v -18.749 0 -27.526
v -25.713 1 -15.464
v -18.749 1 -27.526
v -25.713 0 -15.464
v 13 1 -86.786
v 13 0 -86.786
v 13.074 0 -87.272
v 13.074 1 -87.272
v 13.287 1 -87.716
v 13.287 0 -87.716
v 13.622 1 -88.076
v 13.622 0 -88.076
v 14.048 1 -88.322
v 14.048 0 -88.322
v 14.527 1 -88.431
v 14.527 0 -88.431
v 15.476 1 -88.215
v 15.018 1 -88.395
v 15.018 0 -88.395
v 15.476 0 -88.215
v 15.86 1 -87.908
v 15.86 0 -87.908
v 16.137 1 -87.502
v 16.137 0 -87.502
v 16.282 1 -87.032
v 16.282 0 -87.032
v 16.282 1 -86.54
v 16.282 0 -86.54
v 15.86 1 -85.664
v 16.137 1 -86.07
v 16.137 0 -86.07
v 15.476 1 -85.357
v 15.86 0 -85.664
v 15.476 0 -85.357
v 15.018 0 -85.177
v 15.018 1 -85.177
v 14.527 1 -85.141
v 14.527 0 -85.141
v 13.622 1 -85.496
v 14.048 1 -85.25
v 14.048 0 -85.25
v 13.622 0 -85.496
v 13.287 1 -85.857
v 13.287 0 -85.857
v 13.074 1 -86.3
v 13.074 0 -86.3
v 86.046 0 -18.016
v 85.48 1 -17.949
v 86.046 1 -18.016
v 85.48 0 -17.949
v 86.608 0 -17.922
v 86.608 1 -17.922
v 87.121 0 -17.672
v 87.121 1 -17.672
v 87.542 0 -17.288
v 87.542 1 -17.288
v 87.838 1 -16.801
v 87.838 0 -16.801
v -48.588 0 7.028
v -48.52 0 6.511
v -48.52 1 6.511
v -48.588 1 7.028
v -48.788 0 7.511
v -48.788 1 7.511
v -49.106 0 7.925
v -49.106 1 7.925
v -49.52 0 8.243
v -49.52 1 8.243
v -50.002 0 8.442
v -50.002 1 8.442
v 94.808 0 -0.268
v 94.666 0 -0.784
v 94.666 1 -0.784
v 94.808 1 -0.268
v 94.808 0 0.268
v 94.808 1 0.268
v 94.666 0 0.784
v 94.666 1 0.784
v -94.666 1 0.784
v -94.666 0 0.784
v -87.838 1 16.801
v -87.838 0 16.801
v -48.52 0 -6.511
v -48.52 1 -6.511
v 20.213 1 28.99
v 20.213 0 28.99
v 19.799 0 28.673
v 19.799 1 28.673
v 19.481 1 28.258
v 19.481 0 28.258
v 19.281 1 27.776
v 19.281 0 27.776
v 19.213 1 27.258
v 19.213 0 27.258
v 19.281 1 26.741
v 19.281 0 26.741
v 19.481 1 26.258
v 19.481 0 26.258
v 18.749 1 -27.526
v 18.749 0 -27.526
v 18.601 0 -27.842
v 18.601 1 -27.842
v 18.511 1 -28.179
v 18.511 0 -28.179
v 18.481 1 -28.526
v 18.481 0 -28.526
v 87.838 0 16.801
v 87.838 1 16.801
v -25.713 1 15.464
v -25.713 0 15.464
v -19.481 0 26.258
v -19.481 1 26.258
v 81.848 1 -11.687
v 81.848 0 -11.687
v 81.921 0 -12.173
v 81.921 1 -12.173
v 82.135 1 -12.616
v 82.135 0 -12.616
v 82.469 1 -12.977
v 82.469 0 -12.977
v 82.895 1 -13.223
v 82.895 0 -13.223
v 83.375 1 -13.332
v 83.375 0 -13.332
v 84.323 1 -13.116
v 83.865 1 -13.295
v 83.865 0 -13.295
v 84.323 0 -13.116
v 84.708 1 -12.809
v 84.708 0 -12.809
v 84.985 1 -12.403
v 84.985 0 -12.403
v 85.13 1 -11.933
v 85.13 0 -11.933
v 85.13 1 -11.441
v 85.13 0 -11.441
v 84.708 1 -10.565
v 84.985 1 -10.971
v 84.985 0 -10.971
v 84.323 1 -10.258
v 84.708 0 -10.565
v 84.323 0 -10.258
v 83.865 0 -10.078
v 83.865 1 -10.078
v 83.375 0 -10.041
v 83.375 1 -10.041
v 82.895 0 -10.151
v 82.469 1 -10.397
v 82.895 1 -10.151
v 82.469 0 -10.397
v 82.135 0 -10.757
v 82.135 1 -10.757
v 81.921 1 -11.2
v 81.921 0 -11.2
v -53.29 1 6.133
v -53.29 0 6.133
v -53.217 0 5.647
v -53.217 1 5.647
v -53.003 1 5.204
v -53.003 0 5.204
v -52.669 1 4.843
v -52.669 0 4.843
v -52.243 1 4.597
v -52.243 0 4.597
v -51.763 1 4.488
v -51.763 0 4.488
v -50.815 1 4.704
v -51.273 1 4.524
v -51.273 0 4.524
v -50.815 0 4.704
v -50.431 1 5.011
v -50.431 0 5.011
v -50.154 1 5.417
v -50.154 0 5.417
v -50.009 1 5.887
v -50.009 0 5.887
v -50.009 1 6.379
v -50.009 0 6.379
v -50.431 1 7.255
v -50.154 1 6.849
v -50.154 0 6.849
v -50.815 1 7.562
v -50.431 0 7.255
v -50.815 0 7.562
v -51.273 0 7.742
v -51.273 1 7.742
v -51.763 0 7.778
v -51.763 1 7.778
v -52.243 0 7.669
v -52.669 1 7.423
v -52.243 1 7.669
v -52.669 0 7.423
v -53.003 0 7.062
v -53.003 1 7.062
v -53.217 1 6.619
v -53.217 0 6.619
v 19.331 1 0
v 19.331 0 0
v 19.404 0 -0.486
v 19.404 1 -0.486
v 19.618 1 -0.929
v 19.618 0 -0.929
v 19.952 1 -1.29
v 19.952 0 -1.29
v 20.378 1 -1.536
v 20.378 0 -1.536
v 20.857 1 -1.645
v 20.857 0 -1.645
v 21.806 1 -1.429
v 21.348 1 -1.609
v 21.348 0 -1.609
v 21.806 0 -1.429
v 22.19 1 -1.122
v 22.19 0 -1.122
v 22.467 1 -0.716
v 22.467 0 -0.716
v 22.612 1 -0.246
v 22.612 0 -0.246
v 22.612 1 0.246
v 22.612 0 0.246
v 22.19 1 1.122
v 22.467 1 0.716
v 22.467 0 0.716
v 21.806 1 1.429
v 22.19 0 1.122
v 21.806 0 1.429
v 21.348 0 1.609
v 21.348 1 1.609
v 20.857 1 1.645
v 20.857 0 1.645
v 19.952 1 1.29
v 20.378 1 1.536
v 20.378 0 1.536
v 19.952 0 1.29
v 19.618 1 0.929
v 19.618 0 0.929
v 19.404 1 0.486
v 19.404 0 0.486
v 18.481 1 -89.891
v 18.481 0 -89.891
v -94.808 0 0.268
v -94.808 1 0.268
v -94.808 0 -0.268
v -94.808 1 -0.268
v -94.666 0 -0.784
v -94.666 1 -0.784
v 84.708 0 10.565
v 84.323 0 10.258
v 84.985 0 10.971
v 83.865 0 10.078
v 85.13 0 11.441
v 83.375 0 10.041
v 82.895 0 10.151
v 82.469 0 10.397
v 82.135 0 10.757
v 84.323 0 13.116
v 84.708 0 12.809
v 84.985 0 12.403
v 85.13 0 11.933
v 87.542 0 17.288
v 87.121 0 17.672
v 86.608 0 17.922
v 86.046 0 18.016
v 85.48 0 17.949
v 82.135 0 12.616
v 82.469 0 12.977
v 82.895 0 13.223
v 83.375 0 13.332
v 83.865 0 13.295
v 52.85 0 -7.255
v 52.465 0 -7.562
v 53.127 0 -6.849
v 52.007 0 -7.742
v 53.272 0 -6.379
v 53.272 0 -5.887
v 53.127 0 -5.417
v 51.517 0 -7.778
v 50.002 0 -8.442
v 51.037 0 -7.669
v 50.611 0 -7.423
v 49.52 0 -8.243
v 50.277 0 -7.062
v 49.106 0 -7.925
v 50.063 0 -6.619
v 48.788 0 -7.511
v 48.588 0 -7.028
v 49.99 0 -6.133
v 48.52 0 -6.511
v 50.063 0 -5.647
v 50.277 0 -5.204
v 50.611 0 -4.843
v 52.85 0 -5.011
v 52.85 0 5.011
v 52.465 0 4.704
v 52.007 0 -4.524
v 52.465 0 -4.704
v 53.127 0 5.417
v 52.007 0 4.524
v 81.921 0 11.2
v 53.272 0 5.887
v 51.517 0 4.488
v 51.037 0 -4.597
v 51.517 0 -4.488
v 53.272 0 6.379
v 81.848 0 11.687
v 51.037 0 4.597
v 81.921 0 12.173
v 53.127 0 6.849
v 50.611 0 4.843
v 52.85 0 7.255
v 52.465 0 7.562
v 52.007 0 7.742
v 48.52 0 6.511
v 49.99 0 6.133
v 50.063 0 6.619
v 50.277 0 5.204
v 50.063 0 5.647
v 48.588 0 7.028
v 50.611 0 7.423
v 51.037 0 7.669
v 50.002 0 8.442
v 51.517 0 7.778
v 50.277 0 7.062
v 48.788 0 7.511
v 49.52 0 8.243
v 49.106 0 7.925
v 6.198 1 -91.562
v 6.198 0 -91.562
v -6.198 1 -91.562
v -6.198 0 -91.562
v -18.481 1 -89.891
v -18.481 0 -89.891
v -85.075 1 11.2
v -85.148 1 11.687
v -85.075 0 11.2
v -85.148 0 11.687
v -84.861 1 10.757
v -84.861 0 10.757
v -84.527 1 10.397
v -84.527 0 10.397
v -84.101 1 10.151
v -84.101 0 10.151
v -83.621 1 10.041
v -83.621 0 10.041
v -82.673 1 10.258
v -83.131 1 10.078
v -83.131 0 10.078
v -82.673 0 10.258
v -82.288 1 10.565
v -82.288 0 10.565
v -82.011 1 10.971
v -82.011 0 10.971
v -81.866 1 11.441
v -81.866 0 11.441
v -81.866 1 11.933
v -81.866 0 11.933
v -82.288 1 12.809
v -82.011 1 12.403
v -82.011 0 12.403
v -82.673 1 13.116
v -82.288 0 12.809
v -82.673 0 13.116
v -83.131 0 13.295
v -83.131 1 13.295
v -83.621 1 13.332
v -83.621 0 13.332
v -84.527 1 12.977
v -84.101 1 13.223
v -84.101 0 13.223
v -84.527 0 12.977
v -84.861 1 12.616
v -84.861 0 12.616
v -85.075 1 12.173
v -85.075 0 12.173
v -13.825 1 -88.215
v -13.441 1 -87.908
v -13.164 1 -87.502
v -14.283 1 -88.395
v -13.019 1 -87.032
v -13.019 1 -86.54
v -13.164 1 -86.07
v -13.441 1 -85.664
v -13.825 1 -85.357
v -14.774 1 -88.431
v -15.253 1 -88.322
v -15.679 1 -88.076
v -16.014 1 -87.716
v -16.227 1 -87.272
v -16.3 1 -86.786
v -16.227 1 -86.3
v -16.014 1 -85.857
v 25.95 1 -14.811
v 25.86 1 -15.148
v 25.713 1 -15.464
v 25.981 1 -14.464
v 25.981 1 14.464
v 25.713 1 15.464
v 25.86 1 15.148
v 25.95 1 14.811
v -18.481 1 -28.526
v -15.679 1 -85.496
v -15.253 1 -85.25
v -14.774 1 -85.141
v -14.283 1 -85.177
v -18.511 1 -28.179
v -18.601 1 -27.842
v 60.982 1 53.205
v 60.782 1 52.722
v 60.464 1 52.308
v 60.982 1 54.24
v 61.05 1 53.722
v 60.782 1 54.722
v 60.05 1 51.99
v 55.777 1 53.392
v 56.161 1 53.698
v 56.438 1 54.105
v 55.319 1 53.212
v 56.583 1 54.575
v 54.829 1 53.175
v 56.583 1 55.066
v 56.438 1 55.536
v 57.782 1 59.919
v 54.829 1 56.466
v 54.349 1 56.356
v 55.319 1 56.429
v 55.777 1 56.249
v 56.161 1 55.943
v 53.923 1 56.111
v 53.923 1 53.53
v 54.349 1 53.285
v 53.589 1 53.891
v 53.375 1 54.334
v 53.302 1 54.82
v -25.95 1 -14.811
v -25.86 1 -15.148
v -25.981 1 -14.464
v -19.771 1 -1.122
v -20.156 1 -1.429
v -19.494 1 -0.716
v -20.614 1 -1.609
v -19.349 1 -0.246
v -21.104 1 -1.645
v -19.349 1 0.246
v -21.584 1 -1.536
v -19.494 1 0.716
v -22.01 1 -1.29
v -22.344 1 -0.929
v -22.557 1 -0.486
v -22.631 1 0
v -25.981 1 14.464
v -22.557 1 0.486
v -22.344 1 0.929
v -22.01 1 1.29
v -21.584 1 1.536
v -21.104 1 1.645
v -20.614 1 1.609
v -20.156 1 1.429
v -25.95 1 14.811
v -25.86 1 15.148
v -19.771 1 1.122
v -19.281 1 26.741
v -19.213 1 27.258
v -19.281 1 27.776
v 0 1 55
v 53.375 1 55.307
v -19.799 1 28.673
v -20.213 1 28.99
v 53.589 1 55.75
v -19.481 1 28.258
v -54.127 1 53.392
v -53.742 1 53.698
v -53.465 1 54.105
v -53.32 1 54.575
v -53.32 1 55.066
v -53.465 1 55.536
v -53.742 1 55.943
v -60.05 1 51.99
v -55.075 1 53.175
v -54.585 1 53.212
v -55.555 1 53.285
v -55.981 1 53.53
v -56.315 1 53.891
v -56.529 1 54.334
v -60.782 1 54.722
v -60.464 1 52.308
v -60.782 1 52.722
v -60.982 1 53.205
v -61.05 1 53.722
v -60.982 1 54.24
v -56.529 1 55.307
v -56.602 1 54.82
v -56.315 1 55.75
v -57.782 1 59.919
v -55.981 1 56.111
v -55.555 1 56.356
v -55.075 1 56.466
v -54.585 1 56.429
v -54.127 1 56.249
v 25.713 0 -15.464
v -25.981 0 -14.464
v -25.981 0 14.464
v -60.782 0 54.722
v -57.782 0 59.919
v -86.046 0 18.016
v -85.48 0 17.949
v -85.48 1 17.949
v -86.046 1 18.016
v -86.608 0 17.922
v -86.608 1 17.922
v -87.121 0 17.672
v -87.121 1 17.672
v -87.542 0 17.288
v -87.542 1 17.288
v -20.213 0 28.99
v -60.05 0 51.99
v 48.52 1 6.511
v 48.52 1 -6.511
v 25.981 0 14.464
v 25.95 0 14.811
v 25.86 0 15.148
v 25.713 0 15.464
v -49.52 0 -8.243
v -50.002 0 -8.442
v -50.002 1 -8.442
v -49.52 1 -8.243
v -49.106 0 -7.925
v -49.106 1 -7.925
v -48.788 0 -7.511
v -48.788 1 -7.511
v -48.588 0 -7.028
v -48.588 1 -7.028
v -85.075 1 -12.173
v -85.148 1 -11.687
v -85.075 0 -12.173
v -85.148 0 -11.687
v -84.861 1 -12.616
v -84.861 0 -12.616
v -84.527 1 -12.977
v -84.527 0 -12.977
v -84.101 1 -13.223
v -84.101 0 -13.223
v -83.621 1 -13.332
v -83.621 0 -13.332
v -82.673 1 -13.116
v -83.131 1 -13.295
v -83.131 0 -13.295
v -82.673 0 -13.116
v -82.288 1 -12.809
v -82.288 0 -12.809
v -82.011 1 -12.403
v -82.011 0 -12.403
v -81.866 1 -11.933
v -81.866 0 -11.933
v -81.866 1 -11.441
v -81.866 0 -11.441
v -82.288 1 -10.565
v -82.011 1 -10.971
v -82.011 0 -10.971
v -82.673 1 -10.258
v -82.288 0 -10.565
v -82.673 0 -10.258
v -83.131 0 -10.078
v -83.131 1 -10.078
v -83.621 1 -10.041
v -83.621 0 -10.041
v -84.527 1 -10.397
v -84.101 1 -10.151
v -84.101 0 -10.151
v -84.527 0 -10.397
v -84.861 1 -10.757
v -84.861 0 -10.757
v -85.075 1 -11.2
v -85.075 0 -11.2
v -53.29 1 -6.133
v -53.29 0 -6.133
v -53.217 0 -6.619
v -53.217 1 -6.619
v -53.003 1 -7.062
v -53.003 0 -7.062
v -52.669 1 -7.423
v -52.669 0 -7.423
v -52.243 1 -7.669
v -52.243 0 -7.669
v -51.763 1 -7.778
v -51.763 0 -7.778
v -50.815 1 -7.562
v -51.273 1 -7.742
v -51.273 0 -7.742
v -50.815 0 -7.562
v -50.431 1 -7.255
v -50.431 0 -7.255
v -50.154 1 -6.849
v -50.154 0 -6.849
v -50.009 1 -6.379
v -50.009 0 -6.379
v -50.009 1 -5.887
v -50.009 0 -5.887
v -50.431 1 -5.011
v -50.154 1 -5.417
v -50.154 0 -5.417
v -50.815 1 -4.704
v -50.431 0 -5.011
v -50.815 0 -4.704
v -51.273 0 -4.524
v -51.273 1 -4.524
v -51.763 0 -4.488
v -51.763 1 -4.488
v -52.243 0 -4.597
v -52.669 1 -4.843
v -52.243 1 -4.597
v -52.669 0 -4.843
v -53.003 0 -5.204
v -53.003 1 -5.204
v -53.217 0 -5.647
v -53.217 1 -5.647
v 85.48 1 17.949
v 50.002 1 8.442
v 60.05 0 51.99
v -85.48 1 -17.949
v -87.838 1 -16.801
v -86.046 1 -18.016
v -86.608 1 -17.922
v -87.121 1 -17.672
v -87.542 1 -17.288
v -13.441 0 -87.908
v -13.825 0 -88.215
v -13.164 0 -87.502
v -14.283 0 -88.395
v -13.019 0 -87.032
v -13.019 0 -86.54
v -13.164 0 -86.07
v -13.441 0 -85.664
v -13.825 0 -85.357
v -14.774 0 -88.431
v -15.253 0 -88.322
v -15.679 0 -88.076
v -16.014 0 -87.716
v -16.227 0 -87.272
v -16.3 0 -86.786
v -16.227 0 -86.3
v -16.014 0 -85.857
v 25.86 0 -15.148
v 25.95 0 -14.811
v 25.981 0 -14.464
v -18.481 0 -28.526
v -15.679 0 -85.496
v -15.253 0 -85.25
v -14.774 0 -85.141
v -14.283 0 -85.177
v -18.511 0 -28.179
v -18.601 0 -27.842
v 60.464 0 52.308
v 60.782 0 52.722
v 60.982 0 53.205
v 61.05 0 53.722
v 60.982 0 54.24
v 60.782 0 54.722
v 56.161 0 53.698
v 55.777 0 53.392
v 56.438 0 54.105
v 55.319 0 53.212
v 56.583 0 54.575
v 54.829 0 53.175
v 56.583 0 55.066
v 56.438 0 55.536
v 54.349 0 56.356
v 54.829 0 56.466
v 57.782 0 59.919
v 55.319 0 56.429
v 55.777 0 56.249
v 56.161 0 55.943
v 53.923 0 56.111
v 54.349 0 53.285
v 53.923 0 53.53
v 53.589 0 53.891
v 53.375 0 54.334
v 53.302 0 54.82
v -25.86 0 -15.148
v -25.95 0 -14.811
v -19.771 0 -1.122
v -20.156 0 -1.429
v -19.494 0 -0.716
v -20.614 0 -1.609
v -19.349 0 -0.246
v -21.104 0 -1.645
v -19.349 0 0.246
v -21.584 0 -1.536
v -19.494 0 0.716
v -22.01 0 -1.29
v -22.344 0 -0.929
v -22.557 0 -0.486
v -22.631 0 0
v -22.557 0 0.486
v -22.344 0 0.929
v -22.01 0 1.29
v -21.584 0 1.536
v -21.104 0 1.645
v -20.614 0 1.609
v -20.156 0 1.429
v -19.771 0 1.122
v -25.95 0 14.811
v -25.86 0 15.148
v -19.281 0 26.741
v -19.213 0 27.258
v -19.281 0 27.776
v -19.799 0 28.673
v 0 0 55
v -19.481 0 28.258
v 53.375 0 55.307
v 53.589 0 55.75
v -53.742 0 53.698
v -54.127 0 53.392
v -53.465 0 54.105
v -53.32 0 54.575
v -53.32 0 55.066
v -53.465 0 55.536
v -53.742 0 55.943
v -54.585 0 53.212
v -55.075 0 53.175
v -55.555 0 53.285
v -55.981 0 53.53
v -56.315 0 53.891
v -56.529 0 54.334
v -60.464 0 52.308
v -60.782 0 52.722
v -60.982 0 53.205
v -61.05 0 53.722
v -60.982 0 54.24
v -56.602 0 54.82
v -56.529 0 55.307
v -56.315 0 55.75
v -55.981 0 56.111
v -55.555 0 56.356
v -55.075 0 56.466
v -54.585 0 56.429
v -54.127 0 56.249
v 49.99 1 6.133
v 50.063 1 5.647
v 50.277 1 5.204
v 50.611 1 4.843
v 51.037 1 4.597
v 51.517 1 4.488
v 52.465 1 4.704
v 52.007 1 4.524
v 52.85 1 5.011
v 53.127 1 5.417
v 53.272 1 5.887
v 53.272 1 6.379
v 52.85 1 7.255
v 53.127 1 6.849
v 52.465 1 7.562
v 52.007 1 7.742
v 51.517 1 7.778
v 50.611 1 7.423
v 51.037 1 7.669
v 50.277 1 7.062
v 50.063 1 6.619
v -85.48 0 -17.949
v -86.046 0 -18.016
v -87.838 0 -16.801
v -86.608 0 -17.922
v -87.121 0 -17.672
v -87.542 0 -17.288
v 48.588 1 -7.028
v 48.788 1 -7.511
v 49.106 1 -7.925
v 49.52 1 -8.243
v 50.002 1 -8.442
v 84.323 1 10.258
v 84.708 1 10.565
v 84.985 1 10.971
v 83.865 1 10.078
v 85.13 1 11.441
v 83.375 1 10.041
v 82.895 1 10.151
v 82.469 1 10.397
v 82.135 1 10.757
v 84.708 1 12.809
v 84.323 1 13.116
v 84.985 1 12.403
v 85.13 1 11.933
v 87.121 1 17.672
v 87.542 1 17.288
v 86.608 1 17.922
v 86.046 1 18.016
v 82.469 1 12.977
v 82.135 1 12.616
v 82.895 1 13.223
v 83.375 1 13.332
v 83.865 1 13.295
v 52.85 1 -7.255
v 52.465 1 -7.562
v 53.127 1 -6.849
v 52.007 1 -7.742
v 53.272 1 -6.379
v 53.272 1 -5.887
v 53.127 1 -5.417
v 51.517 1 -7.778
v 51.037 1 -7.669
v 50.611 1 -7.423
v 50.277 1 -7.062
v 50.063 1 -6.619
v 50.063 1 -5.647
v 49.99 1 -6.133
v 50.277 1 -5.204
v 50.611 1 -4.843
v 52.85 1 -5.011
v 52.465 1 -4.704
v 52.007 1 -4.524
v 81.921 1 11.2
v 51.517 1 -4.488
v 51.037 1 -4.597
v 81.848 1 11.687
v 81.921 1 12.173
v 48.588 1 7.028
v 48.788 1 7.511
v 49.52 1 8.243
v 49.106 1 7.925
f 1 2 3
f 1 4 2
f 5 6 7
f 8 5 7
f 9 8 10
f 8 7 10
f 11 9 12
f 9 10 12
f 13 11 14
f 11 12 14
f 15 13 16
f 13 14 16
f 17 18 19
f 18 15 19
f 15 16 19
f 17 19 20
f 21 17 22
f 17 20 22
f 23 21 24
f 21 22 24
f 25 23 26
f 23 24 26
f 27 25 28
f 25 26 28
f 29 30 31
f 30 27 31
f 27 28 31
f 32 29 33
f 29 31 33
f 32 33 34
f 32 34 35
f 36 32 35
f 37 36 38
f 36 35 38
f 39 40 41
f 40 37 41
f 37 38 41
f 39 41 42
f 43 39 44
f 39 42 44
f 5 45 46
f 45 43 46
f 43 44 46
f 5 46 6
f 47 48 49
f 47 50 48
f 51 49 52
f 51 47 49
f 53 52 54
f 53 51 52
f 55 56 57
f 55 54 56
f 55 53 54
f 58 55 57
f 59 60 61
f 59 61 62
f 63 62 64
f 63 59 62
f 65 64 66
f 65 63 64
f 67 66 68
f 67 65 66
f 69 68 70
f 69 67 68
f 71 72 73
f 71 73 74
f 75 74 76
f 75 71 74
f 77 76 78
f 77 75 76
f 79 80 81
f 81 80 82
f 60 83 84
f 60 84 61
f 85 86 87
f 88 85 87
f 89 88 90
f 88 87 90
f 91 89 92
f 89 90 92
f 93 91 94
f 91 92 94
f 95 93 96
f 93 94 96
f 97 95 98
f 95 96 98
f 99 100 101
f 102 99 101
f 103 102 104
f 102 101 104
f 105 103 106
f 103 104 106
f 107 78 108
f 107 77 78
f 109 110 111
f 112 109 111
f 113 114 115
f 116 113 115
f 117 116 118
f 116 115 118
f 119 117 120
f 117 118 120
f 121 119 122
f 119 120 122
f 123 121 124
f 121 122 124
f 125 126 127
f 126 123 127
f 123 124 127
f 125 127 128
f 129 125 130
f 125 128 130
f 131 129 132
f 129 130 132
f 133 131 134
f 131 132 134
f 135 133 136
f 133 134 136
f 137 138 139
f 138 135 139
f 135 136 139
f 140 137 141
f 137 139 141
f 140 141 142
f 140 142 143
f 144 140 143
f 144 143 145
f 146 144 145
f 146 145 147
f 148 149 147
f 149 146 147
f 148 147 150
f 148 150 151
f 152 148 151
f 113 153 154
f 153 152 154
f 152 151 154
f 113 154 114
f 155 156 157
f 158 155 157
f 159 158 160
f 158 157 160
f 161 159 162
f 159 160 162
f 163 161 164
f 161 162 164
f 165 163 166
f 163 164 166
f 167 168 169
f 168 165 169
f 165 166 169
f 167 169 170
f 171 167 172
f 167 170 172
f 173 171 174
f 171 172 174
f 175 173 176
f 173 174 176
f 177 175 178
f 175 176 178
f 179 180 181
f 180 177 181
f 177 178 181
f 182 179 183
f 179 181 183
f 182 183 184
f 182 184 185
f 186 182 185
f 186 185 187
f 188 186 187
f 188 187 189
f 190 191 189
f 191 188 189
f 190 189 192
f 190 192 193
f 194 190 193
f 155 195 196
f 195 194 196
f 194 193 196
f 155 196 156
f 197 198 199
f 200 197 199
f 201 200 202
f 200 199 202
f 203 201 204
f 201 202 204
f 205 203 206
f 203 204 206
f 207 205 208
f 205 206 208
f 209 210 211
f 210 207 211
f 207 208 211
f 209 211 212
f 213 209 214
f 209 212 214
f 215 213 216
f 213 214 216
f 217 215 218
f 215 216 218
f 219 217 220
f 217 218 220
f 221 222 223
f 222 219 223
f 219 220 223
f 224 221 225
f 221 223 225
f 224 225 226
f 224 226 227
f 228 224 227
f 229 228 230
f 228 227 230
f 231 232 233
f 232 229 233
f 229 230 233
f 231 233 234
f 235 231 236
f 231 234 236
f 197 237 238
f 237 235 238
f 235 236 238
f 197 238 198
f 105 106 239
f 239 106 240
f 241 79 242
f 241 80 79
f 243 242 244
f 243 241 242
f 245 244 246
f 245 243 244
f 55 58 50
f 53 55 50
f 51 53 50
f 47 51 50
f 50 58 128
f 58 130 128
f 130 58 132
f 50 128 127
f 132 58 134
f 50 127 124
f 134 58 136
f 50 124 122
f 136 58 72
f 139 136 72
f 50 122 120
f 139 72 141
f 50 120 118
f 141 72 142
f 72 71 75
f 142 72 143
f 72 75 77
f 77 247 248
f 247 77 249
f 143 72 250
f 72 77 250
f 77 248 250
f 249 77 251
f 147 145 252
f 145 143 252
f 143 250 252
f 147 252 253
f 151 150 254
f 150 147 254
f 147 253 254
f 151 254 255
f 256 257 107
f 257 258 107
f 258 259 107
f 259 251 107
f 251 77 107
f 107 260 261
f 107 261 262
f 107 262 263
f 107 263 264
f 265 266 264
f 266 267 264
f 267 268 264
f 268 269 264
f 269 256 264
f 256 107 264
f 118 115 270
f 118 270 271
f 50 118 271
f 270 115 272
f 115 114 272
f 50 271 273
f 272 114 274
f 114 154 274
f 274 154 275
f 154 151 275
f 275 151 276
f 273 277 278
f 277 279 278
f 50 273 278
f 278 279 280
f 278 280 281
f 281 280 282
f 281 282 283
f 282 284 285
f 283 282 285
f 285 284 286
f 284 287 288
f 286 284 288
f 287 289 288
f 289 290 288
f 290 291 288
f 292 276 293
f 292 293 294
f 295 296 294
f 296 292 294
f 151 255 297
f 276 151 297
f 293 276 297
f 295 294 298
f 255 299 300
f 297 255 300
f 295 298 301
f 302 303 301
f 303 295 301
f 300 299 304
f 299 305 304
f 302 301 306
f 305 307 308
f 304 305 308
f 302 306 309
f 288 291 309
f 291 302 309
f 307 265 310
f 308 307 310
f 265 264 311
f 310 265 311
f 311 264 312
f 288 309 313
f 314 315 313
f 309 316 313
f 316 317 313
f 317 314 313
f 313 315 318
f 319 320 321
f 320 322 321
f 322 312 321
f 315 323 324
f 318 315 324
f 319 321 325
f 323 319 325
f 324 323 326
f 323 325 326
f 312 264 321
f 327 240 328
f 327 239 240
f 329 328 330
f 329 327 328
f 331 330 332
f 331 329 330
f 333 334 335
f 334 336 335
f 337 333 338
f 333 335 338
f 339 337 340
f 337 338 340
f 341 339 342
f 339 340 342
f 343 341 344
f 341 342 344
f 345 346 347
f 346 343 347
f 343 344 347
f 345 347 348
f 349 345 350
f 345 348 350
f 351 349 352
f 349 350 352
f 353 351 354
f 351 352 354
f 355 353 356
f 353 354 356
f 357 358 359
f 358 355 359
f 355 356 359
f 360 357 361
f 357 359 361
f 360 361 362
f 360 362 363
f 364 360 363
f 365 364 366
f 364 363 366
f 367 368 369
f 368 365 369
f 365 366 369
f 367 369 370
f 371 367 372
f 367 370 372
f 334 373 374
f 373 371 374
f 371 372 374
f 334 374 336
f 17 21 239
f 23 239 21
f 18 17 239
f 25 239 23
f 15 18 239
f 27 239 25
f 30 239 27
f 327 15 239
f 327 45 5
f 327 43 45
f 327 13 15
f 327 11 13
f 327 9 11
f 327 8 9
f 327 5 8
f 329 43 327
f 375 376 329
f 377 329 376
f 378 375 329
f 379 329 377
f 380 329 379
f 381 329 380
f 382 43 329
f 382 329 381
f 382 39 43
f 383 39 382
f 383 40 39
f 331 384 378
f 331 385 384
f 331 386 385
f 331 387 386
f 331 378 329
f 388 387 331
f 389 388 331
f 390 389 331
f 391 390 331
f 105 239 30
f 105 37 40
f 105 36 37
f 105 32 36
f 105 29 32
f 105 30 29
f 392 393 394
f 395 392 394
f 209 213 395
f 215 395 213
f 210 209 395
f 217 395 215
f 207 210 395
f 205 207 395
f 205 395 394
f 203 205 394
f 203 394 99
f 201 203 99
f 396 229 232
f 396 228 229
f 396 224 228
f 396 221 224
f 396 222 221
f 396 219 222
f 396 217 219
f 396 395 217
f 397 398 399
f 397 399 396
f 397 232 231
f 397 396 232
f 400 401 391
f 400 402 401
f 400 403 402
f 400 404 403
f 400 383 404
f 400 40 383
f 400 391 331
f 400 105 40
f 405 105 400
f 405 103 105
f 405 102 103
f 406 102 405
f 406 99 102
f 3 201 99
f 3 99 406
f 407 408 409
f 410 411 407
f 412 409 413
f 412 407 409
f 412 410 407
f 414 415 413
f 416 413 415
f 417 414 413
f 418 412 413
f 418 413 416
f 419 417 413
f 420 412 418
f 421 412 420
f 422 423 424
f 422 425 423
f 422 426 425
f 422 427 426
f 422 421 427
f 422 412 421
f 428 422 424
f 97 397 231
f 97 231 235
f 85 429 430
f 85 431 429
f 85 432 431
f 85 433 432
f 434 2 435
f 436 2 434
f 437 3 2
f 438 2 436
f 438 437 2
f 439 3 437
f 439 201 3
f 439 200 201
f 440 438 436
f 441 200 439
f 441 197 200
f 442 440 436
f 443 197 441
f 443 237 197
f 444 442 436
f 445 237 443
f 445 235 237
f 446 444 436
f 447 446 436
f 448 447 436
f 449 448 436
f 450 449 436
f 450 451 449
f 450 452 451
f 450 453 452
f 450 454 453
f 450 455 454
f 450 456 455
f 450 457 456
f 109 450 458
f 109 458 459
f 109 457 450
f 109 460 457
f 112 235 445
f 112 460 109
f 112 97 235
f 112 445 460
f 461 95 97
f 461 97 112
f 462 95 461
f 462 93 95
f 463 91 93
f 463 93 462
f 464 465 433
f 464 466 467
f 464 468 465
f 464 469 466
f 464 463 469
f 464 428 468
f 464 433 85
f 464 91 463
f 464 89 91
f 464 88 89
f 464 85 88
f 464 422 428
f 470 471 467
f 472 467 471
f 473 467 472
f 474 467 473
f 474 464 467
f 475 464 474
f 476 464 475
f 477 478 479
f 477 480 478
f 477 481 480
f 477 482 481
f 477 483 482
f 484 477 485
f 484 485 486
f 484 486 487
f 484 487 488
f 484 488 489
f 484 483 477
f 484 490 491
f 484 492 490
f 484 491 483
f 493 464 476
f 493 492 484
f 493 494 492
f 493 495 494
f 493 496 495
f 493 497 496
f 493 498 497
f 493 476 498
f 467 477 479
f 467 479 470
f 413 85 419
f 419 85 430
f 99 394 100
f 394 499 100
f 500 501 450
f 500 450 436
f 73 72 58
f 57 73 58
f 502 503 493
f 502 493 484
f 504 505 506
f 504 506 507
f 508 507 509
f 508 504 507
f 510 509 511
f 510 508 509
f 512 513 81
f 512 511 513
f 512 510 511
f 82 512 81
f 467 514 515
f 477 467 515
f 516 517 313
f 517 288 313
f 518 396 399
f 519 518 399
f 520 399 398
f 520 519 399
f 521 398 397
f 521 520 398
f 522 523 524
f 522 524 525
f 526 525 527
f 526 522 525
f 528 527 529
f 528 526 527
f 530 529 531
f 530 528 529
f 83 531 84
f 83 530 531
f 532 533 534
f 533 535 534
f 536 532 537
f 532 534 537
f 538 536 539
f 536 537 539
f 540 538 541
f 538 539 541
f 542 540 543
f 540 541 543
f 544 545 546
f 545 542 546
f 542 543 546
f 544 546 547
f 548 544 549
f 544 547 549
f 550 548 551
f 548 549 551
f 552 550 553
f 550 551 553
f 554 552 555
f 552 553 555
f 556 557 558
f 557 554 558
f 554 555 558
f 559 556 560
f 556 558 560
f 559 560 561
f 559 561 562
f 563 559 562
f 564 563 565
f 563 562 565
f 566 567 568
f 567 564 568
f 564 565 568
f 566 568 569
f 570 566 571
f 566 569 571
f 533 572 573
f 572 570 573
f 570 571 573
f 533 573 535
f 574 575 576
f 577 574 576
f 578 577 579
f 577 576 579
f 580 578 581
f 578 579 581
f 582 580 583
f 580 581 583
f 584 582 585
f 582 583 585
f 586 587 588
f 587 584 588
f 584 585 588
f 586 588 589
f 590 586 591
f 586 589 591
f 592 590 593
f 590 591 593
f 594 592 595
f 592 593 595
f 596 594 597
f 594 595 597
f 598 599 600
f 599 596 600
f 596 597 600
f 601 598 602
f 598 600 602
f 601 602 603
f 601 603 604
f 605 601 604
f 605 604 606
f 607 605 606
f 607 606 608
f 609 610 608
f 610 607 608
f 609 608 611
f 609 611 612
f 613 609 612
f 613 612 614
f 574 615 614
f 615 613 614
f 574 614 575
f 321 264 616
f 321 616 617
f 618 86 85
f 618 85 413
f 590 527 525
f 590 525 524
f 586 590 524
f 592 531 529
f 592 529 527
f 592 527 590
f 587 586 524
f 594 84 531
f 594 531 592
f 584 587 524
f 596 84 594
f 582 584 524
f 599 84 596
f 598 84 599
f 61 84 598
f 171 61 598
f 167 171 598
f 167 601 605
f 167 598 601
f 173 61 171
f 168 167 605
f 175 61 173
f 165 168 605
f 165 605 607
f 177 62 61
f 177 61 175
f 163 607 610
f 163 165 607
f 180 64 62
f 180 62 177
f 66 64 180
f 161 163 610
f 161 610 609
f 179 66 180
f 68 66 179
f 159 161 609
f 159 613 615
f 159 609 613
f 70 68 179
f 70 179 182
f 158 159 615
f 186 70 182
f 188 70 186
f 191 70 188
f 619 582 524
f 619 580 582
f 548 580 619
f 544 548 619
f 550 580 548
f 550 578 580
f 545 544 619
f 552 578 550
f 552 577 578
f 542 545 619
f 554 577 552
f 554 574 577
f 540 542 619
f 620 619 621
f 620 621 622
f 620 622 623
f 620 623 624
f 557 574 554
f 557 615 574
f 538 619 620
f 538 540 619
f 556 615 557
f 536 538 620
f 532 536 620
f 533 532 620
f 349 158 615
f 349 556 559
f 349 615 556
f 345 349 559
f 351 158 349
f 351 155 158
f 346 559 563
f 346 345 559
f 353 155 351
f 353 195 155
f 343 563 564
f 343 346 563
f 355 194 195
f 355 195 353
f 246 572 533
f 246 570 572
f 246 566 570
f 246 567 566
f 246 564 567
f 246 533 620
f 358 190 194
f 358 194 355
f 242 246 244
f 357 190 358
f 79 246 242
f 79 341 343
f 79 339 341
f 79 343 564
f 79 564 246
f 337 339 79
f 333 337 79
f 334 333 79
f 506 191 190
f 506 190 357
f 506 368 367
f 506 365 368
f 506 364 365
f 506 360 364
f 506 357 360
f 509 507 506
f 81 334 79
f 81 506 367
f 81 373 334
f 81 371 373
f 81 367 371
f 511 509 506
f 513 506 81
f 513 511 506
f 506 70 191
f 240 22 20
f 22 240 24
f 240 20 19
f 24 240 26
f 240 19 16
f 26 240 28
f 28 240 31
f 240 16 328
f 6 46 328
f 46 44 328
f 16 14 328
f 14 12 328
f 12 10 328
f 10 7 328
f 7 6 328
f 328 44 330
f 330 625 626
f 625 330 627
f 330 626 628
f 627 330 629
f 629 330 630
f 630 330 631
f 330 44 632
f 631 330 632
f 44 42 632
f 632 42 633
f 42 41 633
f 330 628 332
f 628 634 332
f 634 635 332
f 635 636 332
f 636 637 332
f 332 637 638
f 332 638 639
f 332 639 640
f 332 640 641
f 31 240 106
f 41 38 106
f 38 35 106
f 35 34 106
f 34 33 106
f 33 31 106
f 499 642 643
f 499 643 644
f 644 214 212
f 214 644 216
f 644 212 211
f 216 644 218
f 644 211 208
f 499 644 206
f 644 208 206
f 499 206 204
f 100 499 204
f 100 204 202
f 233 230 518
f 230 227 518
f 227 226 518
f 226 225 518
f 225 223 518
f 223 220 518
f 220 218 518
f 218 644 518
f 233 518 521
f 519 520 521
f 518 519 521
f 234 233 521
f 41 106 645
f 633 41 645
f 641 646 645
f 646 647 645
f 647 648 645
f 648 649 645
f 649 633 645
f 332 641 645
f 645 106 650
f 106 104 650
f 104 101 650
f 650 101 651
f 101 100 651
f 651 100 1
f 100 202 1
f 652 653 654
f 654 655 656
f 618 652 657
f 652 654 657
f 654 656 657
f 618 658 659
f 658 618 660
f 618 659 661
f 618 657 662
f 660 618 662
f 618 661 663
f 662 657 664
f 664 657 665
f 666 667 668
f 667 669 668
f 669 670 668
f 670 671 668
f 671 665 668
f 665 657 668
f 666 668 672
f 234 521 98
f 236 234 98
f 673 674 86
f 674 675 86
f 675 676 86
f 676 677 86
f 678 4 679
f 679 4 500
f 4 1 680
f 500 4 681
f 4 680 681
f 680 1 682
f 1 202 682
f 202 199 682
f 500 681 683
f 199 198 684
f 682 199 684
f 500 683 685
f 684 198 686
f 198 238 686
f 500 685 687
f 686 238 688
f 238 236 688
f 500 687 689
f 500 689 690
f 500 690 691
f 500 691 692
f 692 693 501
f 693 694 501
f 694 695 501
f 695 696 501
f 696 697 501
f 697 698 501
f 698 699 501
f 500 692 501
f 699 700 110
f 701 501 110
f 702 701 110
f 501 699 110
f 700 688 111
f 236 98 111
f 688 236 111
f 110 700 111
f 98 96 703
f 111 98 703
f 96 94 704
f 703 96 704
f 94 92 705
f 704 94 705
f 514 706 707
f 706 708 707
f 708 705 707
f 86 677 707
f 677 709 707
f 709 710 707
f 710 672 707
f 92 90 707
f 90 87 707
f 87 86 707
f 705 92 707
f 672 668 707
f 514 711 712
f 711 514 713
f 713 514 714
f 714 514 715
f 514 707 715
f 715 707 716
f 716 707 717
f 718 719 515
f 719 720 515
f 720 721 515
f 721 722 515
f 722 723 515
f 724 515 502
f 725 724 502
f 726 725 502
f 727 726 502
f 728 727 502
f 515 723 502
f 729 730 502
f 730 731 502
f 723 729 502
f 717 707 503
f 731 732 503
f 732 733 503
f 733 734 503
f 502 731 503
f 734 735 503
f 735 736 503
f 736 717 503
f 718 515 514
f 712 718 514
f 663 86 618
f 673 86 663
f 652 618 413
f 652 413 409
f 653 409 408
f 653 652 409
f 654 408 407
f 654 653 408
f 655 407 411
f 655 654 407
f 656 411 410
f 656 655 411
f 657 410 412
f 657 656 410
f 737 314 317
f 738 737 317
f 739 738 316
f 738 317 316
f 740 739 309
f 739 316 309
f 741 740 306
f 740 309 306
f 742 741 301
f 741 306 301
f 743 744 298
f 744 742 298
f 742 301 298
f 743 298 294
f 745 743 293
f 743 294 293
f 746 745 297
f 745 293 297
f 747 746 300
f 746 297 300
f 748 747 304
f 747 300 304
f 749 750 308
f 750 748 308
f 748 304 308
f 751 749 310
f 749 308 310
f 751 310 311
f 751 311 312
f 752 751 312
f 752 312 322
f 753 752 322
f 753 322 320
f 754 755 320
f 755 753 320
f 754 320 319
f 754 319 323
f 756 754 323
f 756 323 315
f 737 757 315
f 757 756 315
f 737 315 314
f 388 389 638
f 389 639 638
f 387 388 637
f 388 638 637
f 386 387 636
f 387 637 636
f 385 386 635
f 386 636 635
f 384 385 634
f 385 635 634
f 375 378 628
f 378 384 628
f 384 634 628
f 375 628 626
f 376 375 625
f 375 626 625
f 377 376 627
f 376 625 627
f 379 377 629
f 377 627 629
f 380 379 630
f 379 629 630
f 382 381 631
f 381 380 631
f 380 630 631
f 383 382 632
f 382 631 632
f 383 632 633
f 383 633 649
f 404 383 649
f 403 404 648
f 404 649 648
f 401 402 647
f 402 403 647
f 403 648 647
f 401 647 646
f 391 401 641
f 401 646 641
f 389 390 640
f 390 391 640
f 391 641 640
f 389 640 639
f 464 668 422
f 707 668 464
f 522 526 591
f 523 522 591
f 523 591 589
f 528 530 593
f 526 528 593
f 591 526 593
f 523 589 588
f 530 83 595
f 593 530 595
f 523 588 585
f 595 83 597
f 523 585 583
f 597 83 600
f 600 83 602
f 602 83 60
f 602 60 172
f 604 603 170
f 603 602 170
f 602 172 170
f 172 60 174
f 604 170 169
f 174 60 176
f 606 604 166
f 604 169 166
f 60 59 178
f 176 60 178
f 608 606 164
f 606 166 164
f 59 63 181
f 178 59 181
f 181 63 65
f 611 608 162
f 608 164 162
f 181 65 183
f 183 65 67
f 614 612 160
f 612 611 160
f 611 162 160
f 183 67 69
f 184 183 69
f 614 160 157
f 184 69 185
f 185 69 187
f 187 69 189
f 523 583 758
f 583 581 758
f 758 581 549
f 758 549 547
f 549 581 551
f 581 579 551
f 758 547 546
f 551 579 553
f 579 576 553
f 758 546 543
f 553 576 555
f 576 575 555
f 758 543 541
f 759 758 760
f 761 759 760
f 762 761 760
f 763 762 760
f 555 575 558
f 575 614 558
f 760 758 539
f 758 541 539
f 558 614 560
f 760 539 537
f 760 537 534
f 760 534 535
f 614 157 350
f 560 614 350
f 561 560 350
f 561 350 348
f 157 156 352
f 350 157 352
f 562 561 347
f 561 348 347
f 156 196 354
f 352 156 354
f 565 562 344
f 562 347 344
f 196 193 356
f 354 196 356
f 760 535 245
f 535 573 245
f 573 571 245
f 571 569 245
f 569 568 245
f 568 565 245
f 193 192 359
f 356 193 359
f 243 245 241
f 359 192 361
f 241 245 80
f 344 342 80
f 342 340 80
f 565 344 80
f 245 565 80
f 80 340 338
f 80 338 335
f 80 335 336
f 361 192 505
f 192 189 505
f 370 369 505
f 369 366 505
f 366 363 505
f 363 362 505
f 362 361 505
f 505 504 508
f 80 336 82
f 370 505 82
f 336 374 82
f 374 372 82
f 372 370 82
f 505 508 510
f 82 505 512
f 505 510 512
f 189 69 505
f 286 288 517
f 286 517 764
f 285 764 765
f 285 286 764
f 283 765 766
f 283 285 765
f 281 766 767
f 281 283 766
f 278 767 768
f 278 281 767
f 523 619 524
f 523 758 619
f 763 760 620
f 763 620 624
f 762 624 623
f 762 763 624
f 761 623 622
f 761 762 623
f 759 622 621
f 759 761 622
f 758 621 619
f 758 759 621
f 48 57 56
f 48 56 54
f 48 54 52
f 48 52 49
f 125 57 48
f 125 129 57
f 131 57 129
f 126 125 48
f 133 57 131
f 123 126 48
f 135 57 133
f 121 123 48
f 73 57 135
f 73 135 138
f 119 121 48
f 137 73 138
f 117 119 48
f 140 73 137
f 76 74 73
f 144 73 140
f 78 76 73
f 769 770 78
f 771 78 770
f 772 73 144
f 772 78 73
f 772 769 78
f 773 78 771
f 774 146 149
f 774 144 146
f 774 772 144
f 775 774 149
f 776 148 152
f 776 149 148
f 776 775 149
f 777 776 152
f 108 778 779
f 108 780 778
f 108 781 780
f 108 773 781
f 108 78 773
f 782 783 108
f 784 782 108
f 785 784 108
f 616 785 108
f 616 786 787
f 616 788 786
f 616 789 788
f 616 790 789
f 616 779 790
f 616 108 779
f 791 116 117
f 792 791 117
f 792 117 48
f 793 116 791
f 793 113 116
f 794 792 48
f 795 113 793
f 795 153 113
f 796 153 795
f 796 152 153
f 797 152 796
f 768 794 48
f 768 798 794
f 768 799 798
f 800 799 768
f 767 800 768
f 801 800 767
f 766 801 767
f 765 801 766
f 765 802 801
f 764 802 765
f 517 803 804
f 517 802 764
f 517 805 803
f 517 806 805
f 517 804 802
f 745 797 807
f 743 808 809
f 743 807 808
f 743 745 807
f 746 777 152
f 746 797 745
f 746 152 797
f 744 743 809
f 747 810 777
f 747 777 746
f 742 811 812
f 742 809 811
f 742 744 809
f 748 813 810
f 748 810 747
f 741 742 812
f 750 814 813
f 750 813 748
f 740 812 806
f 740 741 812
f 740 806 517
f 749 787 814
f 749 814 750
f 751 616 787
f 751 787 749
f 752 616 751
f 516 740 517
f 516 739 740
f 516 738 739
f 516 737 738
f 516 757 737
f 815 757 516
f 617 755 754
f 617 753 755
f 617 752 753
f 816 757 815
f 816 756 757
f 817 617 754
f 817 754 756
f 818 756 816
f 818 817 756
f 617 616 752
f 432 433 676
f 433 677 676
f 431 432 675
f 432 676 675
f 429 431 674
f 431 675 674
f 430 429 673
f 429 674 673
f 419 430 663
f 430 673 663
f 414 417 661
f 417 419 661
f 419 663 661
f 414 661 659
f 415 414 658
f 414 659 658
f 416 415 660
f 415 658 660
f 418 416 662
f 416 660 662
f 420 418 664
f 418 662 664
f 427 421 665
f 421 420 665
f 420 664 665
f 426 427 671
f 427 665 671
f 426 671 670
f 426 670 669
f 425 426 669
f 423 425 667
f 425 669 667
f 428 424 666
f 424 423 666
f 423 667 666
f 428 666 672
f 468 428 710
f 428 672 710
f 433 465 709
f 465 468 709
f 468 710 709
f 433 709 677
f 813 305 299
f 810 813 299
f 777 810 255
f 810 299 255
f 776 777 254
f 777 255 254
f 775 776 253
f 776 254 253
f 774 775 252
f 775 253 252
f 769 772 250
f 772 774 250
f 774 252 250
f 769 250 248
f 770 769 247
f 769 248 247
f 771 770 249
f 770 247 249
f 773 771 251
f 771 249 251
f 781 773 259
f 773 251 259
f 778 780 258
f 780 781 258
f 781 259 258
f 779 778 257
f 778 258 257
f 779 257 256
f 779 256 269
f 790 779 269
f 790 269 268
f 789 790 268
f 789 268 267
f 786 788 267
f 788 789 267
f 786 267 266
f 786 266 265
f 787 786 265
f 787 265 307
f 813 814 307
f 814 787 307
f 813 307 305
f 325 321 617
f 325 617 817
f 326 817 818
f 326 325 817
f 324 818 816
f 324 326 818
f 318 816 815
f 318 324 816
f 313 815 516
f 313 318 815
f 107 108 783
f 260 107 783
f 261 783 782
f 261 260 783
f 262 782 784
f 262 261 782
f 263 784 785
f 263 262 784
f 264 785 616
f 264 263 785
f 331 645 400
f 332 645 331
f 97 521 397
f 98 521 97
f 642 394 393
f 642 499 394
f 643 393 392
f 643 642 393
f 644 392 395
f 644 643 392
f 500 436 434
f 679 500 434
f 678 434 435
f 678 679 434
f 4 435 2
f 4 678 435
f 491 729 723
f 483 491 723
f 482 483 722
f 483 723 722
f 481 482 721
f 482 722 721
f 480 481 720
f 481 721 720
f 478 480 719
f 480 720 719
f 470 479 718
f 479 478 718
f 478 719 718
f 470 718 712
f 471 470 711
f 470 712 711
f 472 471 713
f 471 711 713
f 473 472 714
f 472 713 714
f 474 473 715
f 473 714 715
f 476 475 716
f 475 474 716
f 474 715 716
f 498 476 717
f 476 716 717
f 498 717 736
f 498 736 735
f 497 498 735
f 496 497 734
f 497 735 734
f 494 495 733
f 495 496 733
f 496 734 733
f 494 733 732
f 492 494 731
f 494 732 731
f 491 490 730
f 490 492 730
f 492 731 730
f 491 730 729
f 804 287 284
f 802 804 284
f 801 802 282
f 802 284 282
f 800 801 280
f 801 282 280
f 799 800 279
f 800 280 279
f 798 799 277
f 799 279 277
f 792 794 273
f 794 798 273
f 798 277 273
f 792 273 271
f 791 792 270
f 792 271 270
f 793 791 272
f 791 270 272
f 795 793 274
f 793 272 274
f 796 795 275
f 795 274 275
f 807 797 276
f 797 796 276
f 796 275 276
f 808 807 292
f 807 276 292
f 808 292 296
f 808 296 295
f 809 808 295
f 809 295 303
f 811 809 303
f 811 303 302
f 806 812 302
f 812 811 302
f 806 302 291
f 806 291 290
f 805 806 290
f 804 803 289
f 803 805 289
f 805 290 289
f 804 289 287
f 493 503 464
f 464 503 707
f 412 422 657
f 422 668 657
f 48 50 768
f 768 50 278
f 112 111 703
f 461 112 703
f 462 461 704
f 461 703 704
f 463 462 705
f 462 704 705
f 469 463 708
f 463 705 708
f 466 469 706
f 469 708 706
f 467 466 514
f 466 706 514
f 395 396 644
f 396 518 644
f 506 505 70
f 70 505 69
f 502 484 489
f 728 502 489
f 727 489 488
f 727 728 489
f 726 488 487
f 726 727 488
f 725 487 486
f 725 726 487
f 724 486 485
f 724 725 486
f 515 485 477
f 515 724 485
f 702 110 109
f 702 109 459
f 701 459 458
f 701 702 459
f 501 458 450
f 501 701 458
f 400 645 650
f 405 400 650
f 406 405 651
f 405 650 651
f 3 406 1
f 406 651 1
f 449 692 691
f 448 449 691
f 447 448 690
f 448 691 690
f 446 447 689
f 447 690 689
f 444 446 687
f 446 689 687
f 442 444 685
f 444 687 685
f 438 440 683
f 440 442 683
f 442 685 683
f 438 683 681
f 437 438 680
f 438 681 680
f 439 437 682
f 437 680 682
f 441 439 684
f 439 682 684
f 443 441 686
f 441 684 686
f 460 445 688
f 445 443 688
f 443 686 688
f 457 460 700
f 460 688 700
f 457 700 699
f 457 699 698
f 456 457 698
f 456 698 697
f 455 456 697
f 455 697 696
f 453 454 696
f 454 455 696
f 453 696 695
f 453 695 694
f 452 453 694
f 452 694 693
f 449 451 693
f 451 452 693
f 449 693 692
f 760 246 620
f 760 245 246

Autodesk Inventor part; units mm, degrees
ref_plane "YZ Plane" through (0, 0, 0) normal (1, 0, 0) x (0, 1, 0)
ref_plane "XZ Plane" through (0, 0, 0) normal (0, 1, 0) x (-1, 0, 0)
ref_plane "XY Plane" through (0, 0, 0) normal (0, 0, 1) x (1, 0, 0)
sketch "Sketch1" plane through (0, 0, 0) normal (0, 1, 0) x (-1, 0, 0)
  line L0 (-18.4808, -28.5263) -> (-18.4808, -88.5379)
  line L1 (25.7128, 15.4641) -> (19.4808, 26.2583)
  arc A0 (20.2128, 28.9904) -> (19.4808, 26.2583) centre (21.2128, 27.2583) ccw
  arc A1 (-60.782, 54.7224) -> (-60.05, 51.9904) centre (-59.05, 53.7224) ccw
  line L2 (-20.2128, 28.9904) -> (-60.05, 51.9904)
  arc A2 (60.05, 51.9904) -> (60.782, 54.7224) centre (59.05, 53.7224) ccw
  line L3 (20.2128, 28.9904) -> (60.05, 51.9904)
  arc A3 (-85.4804, 17.9488) -> (-87.8378, 16.8012) centre (-85.998, 16.0169) ccw
  arc A4 (-94.6657, 0.7843) -> (-94.6657, -0.7843) centre (-92.8259, 0) ccw
  arc A5 (-87.8378, -16.8012) -> (-85.4804, -17.9488) centre (-85.998, -16.0169) ccw
  line L4 (-94.6657, -0.7843) -> (-87.8378, -16.8012)
  line L5 (-94.6657, 0.7843) -> (-87.8378, 16.8012)
  arc A6 (48.5201, -6.5107) -> (50.0024, -8.4425) centre (50.5201, -6.5107) ccw
  line L6 (48.5201, -6.5107) -> (48.5201, 6.5107)
  arc A7 (50.0024, 8.4425) -> (48.5201, 6.5107) centre (50.5201, 6.5107) ccw
  line L7 (85.4804, 17.9488) -> (50.0024, 8.4425)
  line L8 (85.4804, -17.9488) -> (50.0024, -8.4425)
  arc A8 (87.8378, 16.8012) -> (85.4804, 17.9488) centre (85.998, 16.0169) ccw
  line L9 (94.6657, 0.7843) -> (87.8378, 16.8012)
  line L10 (-18.4808, -88.5379) -> (-18.4808, -91.8911)
  line L11 (18.4808, -88.5379) -> (18.4808, -91.8911)
  line L12 (18.4808, -28.5263) -> (18.4808, -88.5379)
  line L13 (-25.7128, -15.4641) -> (-18.7487, -27.5263)
  arc A9 (-25.9808, -14.4641) -> (-25.7128, -15.4641) centre (-23.9808, -14.4641) ccw
  arc A10 (-18.4808, -28.5263) -> (-18.7487, -27.5263) centre (-20.4808, -28.5263) ccw
  line L14 (-85.4804, 17.9488) -> (-50.0024, 8.4425)
  line L15 (-85.4804, -17.9488) -> (-50.0024, -8.4425)
  line L16 (25.7128, -15.4641) -> (18.7487, -27.5263)
  arc A11 (25.7128, -15.4641) -> (25.9808, -14.4641) centre (23.9808, -14.4641) ccw
  arc A12 (18.7487, -27.5263) -> (18.4808, -28.5263) centre (20.4808, -28.5263) ccw
  arc A13 (25.9808, 14.4641) -> (25.7128, 15.4641) centre (23.9808, 14.4641) ccw
  line L17 (25.9808, 14.4641) -> (25.9808, -14.4641)
  arc A14 (85.4804, -17.9488) -> (87.8378, -16.8012) centre (85.998, -16.0169) ccw
  arc A15 (94.6657, -0.7843) -> (94.6657, 0.7843) centre (92.8259, 0) ccw
  line L18 (94.6657, -0.7843) -> (87.8378, -16.8012)
  line L19 (-25.9808, 14.4641) -> (-25.9808, -14.4641)
  line L20 (-25.7128, 15.4641) -> (-19.4808, 26.2583)
  arc A16 (-25.7128, 15.4641) -> (-25.9808, 14.4641) centre (-23.9808, 14.4641) ccw
  arc A17 (-19.4808, 26.2583) -> (-20.2128, 28.9904) centre (-21.2128, 27.2583) ccw
  arc A18 (-50.0024, -8.4425) -> (-48.5201, -6.5107) centre (-50.5201, -6.5107) ccw
  line L21 (-48.5201, -6.5107) -> (-48.5201, 6.5107)
  arc A19 (-48.5201, 6.5107) -> (-50.0024, 8.4425) centre (-50.5201, 6.5107) ccw
  arc A20 (-18.4808, -91.8911) -> (18.4808, -91.8911) centre (0, 0) ccw
  line L22 (-18.4808, -91.8911) -> (-18.4808, -28.5263)
  line L23 (-18.7487, -27.5263) -> (-25.7128, -15.4641)
  line L24 (-25.9808, -14.4641) -> (-25.9808, 14.4641)
  line L25 (-25.7128, 15.4641) -> (-19.4808, 26.2583)
  line L26 (-20.2128, 28.9904) -> (-60.05, 51.9904)
  line L27 (60.05, 51.9904) -> (20.2128, 28.9904)
  line L28 (19.4808, 26.2583) -> (25.7128, 15.4641)
  line L29 (25.9808, 14.4641) -> (25.9808, -14.4641)
  line L30 (25.7128, -15.4641) -> (18.7487, -27.5263)
  line L31 (18.4808, -28.5263) -> (18.4808, -91.8911)
  arc A21 (-18.4808, -28.5263) -> (-18.7487, -27.5263) centre (-20.4808, -28.5263) ccw
  arc A22 (-25.9808, -14.4641) -> (-25.7128, -15.4641) centre (-23.9808, -14.4641) ccw
  arc A23 (-25.7128, 15.4641) -> (-25.9808, 14.4641) centre (-23.9808, 14.4641) ccw
  arc A24 (-19.4808, 26.2583) -> (-20.2128, 28.9904) centre (-21.2128, 27.2583) ccw
  arc A25 (-60.782, 54.7224) -> (-60.05, 51.9904) centre (-59.05, 53.7224) ccw
  arc A26 (60.05, 51.9904) -> (60.782, 54.7224) centre (59.05, 53.7224) ccw
  arc A27 (20.2128, 28.9904) -> (19.4808, 26.2583) centre (21.2128, 27.2583) ccw
  arc A28 (25.9808, 14.4641) -> (25.7128, 15.4641) centre (23.9808, 14.4641) ccw
  arc A29 (25.7128, -15.4641) -> (25.9808, -14.4641) centre (23.9808, -14.4641) ccw
  arc A30 (18.7487, -27.5263) -> (18.4808, -28.5263) centre (20.4808, -28.5263) ccw
  line L32 (-50.0024, -8.4425) -> (-85.4804, -17.9488)
  line L33 (-87.8378, -16.8012) -> (-94.6657, -0.7843)
  line L34 (-94.6657, 0.7843) -> (-87.8378, 16.8012)
  line L35 (-85.4804, 17.9488) -> (-50.0024, 8.4425)
  line L36 (-48.5201, 6.5107) -> (-48.5201, -6.5107)
  arc A31 (-87.8378, -16.8012) -> (-85.4804, -17.9488) centre (-85.998, -16.0169) ccw
  arc A32 (-94.6657, 0.7843) -> (-94.6657, -0.7843) centre (-92.8259, 0) ccw
  arc A33 (-85.4804, 17.9488) -> (-87.8378, 16.8012) centre (-85.998, 16.0169) ccw
  arc A34 (-48.5201, 6.5107) -> (-50.0024, 8.4425) centre (-50.5201, 6.5107) ccw
  arc A35 (-50.0024, -8.4425) -> (-48.5201, -6.5107) centre (-50.5201, -6.5107) ccw
  arc A36 (48.5201, -6.5107) -> (50.0024, -8.4425) centre (50.5201, -6.5107) ccw
  arc A37 (50.0024, 8.4425) -> (48.5201, 6.5107) centre (50.5201, 6.5107) ccw
  arc A38 (85.4804, -17.9488) -> (87.8378, -16.8012) centre (85.998, -16.0169) ccw
  arc A39 (94.6657, -0.7843) -> (94.6657, 0.7843) centre (92.8259, 0) ccw
  arc A40 (87.8378, 16.8012) -> (85.4804, 17.9488) centre (85.998, 16.0169) ccw
  line L37 (87.8378, -16.8012) -> (94.6657, -0.7843)
  line L38 (94.6657, 0.7843) -> (87.8378, 16.8012)
  line L39 (85.4804, 17.9488) -> (50.0024, 8.4425)
  line L40 (48.5201, 6.5107) -> (48.5201, -6.5107)
  line L41 (50.0024, -8.4425) -> (85.4804, -17.9488)
  line L42 (19.4808, -26.2583) -> (25.7128, -15.4641)
  arc A41 (25.7128, -15.4641) -> (25.9808, -14.4641) centre (23.9808, -14.4641) ccw
  line L43 (25.9808, -14.4641) -> (25.9808, 14.4641)
  arc A42 (25.9808, 14.4641) -> (25.7128, 15.4641) centre (23.9808, 14.4641) ccw
  arc A43 (-25.7128, 15.4641) -> (-25.9808, 14.4641) centre (-23.9808, 14.4641) ccw
  line L44 (-25.9808, 14.4641) -> (-25.9808, -14.4641)
  arc A44 (-25.9808, -14.4641) -> (-25.7128, -15.4641) centre (-23.9808, -14.4641) ccw
  line L45 (-25.7128, -15.4641) -> (-19.4808, -26.2583)
  line L46 (-50.0024, 8.4425) -> (-85.4804, 17.9488)
  arc A45 (-85.4804, 17.9488) -> (-87.8378, 16.8012) centre (-85.998, 16.0169) ccw
  line L47 (-87.8378, 16.8012) -> (-94.6657, 0.7843)
  arc A46 (-94.6657, 0.7843) -> (-94.6657, -0.7843) centre (-92.8259, 0) ccw
  line L48 (-94.6657, -0.7843) -> (-87.8378, -16.8012)
  arc A47 (-87.8378, -16.8012) -> (-85.4804, -17.9488) centre (-85.998, -16.0169) ccw
  line L49 (-85.4804, -17.9488) -> (-50.0024, -8.4425)
  arc A48 (-50.0024, -8.4425) -> (-48.5201, -6.5107) centre (-50.5201, -6.5107) ccw
  line L50 (-48.5201, -6.5107) -> (-48.5201, 6.5107)
  arc A49 (-48.5201, 6.5107) -> (-50.0024, 8.4425) centre (-50.5201, 6.5107) ccw
  arc A50 (85.4804, -17.9488) -> (87.8378, -16.8012) centre (85.998, -16.0169) ccw
  line L51 (87.8378, -16.8012) -> (94.6657, -0.7843)
  arc A51 (94.6657, -0.7843) -> (94.6657, 0.7843) centre (92.8259, 0) ccw
  line L52 (94.6657, 0.7843) -> (87.8378, 16.8012)
  arc A52 (87.8378, 16.8012) -> (85.4804, 17.9488) centre (85.998, 16.0169) ccw
  line L53 (85.4804, 17.9488) -> (50.0024, 8.4425)
  arc A53 (50.0024, 8.4425) -> (48.5201, 6.5107) centre (50.5201, 6.5107) ccw
  line L54 (48.5201, 6.5107) -> (48.5201, -6.5107)
  arc A54 (48.5201, -6.5107) -> (50.0024, -8.4425) centre (50.5201, -6.5107) ccw
  line L55 (50.0024, -8.4425) -> (85.4804, -17.9488)
  line L56 (57.782, 59.9186) -> (0, 55)
  line L57 (-57.782, 59.9186) -> (0, 55)
  line L58 (-57.782, 59.9186) -> (-60.782, 54.7224)
  line L59 (57.782, 59.9186) -> (60.782, 54.7224)
  line L60 (18.4808, -91.8911) -> (18.4808, -88.5379)
  line L61 (18.4808, -91.8911) -> (18.4808, -89.8911)
  circle A55 centre (-54.9519, 54.8205) radius 1.65
  circle A56 centre (54.9519, 54.8205) radius 1.65
  circle A57 centre (-20.9808, 0) radius 1.65
  circle A58 centre (20.9808, 0) radius 1.65
  circle A59 centre (-14.6505, -86.7861) radius 1.65
  circle A60 centre (14.6505, -86.7861) radius 1.65
  circle A61 centre (51.6401, 6.133) radius 1.65
  circle A62 centre (51.6401, -6.133) radius 1.65
  circle A63 centre (83.498, 11.6868) radius 1.65
  circle A64 centre (83.498, -11.6868) radius 1.65
  circle A65 centre (-51.6401, 6.133) radius 1.65
  circle A66 centre (-51.6401, -6.133) radius 1.65
  circle A67 centre (-83.498, 11.6868) radius 1.65
  circle A68 centre (-83.498, -11.6868) radius 1.65
  dimension "d19" = 2
ref_plane "Work Plane2" through (0, 1, 0) normal (0, 1, 0) x (1, 0, 0)
extrude "Extrusion5" add sketch "Sketch1" along normal blind 1
sketch "Sketch2" plane through (0, 1, 0) normal (0, 1, 0) x (1, 0, 0)
  circle A0 centre (-14.6505, 21.7861) radius 1.25 projected
  circle A1 centre (-14.6505, 87.3566) radius 1.25 projected
  circle A2 centre (-44.6505, -51.9904) radius 1.25 projected
  circle A3 centre (14.6505, 21.7861) radius 1.25 projected
  circle A4 centre (44.6505, -51.9904) radius 1.25 projected
  circle A5 centre (14.6505, -51.9904) radius 1.25 projected
  circle A6 centre (14.6505, -18.2139) radius 1.25 projected
  circle A7 centre (-14.6505, -51.9904) radius 1.25 projected
  circle A8 centre (14.6505, 71.7861) radius 1.25 projected
  circle A9 centre (-14.6505, 71.7861) radius 1.25 projected
  line L0 (60.05, -51.9904) -> (20.2128, -28.9904) projected
  arc A10 (19.4808, -26.2583) -> (20.2128, -28.9904) centre (21.2128, -27.2583) ccw projected
  line L1 (19.4808, -26.2583) -> (25.7128, -15.4641) projected
  arc A11 (25.7128, -15.4641) -> (25.9808, -14.4641) centre (23.9808, -14.4641) ccw projected
  line L2 (25.9808, -14.4641) -> (25.9808, 14.4641) projected
  arc A12 (25.9808, 14.4641) -> (25.7128, 15.4641) centre (23.9808, 14.4641) ccw projected
  line L3 (25.7128, 15.4641) -> (18.7487, 27.5263) projected
  arc A13 (18.4808, 28.5263) -> (18.7487, 27.5263) centre (20.4808, 28.5263) ccw projected
  line L4 (18.4808, 28.5263) -> (18.4808, 91.8911) projected
  arc A14 (18.4808, 91.8911) -> (-18.4808, 91.8911) centre (0, 0) ccw projected
  line L5 (-18.4808, 91.8911) -> (-18.4808, 28.5263) projected
  arc A15 (-18.7487, 27.5263) -> (-18.4808, 28.5263) centre (-20.4808, 28.5263) ccw projected
  line L6 (-18.7487, 27.5263) -> (-25.7128, 15.4641) projected
  arc A16 (-25.7128, 15.4641) -> (-25.9808, 14.4641) centre (-23.9808, 14.4641) ccw projected
  line L7 (-25.9808, 14.4641) -> (-25.9808, -14.4641) projected
  arc A17 (-25.9808, -14.4641) -> (-25.7128, -15.4641) centre (-23.9808, -14.4641) ccw projected
  line L8 (-25.7128, -15.4641) -> (-19.4808, -26.2583) projected
  arc A18 (-20.2128, -28.9904) -> (-19.4808, -26.2583) centre (-21.2128, -27.2583) ccw projected
  line L9 (-20.2128, -28.9904) -> (-60.05, -51.9904) projected
  arc A19 (-60.05, -51.9904) -> (-60.782, -54.7224) centre (-59.05, -53.7224) ccw projected
  line L10 (-60.782, -54.7224) -> (-57.782, -59.9186) projected
  line L11 (-57.782, -59.9186) -> (0, -55) projected
  line L12 (0, -55) -> (57.782, -59.9186) projected
  line L13 (57.782, -59.9186) -> (60.782, -54.7224) projected
  arc A20 (60.782, -54.7224) -> (60.05, -51.9904) centre (59.05, -53.7224) ccw projected
  line L14 (-18.4808, 91.8911) -> (-18.4808, 89.8911)
  line L15 (-18.4808, 91.8911) -> (-18.4808, 28.5263) projected
  line L16 (18.4808, 91.8911) -> (18.4808, 89.8911)
  line L17 (18.4808, 28.5263) -> (18.4808, 91.8911) projected
  arc A21 (18.4808, 91.8911) -> (-18.4808, 91.8911) centre (0, 0) ccw
  arc A22 (18.4808, 89.8911) -> (-18.4808, 89.8911) centre (0, 0) ccw
  dimension "d20" = 2
extrude "Extrusion2" cut sketch "Sketch2" against normal blind 1 contours A22 L5 A14 L4
properties part number "Veroboard Bottom Plate" material "Veroboard"
